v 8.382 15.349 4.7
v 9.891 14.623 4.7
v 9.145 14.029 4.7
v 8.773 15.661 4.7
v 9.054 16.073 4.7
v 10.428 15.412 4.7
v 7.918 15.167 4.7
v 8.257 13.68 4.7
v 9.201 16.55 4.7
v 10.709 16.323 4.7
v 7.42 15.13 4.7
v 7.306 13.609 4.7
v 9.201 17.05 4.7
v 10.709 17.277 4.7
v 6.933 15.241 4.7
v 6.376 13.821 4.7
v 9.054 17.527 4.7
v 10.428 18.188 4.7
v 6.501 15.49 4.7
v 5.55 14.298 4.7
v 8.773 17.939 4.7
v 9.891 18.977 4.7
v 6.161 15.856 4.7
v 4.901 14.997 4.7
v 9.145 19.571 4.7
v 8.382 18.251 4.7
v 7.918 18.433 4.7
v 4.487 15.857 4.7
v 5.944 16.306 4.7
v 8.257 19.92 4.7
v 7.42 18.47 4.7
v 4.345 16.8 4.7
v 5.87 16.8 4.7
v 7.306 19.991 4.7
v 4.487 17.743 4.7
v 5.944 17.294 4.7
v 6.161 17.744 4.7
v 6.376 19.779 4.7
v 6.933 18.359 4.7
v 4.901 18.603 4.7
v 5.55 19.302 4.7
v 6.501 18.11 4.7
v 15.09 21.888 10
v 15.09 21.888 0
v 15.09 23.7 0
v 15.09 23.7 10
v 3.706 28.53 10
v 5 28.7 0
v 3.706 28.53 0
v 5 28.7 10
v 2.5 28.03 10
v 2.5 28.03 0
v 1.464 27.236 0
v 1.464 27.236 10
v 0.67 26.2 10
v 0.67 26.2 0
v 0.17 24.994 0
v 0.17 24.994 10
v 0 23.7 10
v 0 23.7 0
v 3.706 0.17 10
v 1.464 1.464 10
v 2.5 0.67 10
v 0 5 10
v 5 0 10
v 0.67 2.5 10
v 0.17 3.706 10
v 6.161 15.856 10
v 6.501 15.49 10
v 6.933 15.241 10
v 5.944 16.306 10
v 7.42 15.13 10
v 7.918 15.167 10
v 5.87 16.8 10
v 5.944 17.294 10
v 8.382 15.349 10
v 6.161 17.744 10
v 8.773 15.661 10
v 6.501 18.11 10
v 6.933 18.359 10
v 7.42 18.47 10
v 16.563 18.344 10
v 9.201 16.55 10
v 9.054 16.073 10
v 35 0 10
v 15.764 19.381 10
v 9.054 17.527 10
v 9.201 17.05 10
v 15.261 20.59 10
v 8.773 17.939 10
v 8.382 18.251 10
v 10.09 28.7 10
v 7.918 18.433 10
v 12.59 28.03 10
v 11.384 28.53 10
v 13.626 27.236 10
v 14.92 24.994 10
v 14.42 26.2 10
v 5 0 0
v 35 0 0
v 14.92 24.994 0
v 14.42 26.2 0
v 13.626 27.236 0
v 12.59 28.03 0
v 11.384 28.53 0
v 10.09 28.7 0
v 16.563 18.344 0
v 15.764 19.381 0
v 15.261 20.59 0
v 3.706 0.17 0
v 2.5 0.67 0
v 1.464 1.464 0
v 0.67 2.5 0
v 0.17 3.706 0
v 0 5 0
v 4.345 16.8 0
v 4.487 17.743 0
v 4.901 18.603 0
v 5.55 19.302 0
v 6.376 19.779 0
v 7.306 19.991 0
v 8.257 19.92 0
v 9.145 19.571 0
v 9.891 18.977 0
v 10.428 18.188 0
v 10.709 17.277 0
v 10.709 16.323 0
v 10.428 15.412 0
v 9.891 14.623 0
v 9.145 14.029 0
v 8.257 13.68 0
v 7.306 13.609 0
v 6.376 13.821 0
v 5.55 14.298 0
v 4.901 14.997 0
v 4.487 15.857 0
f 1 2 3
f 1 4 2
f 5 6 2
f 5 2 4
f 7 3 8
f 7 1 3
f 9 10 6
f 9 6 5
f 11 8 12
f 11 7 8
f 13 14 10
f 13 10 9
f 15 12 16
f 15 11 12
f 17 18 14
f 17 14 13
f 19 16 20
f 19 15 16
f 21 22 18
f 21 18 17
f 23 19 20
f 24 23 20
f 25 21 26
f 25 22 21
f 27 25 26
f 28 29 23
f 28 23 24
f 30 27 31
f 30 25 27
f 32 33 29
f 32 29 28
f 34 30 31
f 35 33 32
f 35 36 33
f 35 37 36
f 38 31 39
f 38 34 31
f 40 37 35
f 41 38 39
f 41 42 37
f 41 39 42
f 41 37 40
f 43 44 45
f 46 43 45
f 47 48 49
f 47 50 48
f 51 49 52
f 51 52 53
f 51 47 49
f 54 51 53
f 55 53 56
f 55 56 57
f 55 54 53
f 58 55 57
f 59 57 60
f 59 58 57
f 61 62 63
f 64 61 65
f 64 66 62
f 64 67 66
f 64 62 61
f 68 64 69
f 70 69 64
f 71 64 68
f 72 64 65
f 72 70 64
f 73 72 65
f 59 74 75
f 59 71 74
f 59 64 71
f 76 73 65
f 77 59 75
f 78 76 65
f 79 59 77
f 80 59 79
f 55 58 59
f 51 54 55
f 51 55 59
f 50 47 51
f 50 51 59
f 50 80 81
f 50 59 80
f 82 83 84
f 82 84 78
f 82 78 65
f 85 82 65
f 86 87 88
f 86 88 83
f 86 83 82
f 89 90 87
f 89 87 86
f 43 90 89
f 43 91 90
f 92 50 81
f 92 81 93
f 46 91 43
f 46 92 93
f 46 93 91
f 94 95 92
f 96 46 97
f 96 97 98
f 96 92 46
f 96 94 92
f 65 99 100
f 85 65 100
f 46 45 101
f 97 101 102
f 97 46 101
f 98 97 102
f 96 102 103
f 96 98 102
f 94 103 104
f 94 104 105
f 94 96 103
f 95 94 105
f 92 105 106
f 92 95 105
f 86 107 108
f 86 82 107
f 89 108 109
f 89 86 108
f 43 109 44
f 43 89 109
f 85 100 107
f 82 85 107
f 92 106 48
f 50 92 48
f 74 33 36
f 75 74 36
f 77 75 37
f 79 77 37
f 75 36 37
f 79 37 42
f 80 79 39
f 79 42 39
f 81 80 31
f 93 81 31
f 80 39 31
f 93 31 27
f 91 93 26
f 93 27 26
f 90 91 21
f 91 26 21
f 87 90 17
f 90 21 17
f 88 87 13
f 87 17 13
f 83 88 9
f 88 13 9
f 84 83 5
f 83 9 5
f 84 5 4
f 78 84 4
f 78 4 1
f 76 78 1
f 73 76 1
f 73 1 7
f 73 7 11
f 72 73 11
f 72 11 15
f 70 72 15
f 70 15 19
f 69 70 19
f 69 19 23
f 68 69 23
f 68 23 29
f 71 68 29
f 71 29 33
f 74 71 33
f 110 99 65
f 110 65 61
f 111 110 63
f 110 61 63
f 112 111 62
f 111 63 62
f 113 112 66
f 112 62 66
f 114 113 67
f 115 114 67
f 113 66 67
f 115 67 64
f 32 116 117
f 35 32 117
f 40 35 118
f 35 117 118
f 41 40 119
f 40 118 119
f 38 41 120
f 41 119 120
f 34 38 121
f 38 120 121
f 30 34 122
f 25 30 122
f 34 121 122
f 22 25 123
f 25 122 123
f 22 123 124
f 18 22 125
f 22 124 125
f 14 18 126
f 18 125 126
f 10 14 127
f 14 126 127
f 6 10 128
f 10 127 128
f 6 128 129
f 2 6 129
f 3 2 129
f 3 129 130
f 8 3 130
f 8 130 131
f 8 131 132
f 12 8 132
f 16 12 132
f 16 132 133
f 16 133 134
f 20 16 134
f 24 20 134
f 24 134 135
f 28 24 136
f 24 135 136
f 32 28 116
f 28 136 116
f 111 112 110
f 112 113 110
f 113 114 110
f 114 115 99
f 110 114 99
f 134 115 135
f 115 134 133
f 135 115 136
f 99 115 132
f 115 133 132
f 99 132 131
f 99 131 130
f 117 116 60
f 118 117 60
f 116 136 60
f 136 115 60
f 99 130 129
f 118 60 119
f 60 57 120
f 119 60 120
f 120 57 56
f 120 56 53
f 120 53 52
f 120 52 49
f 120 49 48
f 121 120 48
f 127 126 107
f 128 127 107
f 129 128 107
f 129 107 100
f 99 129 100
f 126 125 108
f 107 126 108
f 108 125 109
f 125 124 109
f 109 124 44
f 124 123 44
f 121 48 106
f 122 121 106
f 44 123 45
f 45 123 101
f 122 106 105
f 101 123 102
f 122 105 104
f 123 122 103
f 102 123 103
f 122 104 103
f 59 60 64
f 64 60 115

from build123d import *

# Parameters (mm, degrees)
BOSS_EXTRUDE1_DEPTH = 10
FILLET1_R           = 5
SKETCH2_R           = 3.2
CUT_EXTRUDE1_DEPTH  = 4.7
SKETCH3_R           = 1.6
CUT_EXTRUDE2_DEPTH  = 10
SKETCH5_R           = 3.2
CUT_EXTRUDE3_DEPTH  = 4.7
SKETCH6_R           = 3.2
BOSS_EXTRUDE2_DEPTH = 4.7
SKETCH8_R           = 1.675
CUT_EXTRUDE4_DEPTH  = 10


with BuildPart() as part:
    # Sketch1 → Boss-Extrude1 (new body)
    with BuildSketch(Plane.XY):
        Polygon((0, 0), (35, 0), (15.09, 19.81), (15.09, 28.7), (0, 28.7), align=None)
    extrude(amount=BOSS_EXTRUDE1_DEPTH)

    # Fillet1
    fillet1_edges = [part.edges().sort_by_distance(p)[0] for p in [
        (0, 28.7, 5),
        (15.09, 28.7, 5),
        (15.09, 19.81, 5),
        (0, 0, 5),
    ]]
    fillet(fillet1_edges, radius=FILLET1_R)

    # Sketch2 → Cut-Extrude1 (cut)
    with BuildSketch(Plane.XY.offset(10)):
        with Locations((7.545, 16.8)):
            Circle(SKETCH2_R)
    extrude(amount=-CUT_EXTRUDE1_DEPTH, mode=Mode.SUBTRACT)

    # Sketch3 → Cut-Extrude2 (cut)
    with BuildSketch(Plane.XY.offset(10)):
        with Locations((7.545, 16.8)):
            Circle(SKETCH3_R)
    extrude(amount=-CUT_EXTRUDE2_DEPTH, mode=Mode.SUBTRACT)

    # Sketch5 → Cut-Extrude3 (cut)
    with BuildSketch(Plane(origin=(0, 0, 0), x_dir=(-1, 0, 0), z_dir=(0, 0, -1))):
        with Locations((-7.545, 16.8)):
            Circle(SKETCH5_R)
    extrude(amount=-CUT_EXTRUDE3_DEPTH, mode=Mode.SUBTRACT)

    # Sketch6 → Boss-Extrude2 (add)
    with BuildSketch(Plane.XY.offset(10)):
        with Locations((7.545, 16.8)):
            Circle(SKETCH6_R)
    extrude(amount=-BOSS_EXTRUDE2_DEPTH)

    # Sketch8 → Cut-Extrude4 (cut)
    with BuildSketch(Plane(origin=(0, 0, 0), x_dir=(-1, 0, 0), z_dir=(0, 0, -1))):
        with Locations((-7.545, 16.8)):
            Circle(SKETCH8_R)
    extrude(amount=-CUT_EXTRUDE4_DEPTH, mode=Mode.SUBTRACT)


solid = part.part
